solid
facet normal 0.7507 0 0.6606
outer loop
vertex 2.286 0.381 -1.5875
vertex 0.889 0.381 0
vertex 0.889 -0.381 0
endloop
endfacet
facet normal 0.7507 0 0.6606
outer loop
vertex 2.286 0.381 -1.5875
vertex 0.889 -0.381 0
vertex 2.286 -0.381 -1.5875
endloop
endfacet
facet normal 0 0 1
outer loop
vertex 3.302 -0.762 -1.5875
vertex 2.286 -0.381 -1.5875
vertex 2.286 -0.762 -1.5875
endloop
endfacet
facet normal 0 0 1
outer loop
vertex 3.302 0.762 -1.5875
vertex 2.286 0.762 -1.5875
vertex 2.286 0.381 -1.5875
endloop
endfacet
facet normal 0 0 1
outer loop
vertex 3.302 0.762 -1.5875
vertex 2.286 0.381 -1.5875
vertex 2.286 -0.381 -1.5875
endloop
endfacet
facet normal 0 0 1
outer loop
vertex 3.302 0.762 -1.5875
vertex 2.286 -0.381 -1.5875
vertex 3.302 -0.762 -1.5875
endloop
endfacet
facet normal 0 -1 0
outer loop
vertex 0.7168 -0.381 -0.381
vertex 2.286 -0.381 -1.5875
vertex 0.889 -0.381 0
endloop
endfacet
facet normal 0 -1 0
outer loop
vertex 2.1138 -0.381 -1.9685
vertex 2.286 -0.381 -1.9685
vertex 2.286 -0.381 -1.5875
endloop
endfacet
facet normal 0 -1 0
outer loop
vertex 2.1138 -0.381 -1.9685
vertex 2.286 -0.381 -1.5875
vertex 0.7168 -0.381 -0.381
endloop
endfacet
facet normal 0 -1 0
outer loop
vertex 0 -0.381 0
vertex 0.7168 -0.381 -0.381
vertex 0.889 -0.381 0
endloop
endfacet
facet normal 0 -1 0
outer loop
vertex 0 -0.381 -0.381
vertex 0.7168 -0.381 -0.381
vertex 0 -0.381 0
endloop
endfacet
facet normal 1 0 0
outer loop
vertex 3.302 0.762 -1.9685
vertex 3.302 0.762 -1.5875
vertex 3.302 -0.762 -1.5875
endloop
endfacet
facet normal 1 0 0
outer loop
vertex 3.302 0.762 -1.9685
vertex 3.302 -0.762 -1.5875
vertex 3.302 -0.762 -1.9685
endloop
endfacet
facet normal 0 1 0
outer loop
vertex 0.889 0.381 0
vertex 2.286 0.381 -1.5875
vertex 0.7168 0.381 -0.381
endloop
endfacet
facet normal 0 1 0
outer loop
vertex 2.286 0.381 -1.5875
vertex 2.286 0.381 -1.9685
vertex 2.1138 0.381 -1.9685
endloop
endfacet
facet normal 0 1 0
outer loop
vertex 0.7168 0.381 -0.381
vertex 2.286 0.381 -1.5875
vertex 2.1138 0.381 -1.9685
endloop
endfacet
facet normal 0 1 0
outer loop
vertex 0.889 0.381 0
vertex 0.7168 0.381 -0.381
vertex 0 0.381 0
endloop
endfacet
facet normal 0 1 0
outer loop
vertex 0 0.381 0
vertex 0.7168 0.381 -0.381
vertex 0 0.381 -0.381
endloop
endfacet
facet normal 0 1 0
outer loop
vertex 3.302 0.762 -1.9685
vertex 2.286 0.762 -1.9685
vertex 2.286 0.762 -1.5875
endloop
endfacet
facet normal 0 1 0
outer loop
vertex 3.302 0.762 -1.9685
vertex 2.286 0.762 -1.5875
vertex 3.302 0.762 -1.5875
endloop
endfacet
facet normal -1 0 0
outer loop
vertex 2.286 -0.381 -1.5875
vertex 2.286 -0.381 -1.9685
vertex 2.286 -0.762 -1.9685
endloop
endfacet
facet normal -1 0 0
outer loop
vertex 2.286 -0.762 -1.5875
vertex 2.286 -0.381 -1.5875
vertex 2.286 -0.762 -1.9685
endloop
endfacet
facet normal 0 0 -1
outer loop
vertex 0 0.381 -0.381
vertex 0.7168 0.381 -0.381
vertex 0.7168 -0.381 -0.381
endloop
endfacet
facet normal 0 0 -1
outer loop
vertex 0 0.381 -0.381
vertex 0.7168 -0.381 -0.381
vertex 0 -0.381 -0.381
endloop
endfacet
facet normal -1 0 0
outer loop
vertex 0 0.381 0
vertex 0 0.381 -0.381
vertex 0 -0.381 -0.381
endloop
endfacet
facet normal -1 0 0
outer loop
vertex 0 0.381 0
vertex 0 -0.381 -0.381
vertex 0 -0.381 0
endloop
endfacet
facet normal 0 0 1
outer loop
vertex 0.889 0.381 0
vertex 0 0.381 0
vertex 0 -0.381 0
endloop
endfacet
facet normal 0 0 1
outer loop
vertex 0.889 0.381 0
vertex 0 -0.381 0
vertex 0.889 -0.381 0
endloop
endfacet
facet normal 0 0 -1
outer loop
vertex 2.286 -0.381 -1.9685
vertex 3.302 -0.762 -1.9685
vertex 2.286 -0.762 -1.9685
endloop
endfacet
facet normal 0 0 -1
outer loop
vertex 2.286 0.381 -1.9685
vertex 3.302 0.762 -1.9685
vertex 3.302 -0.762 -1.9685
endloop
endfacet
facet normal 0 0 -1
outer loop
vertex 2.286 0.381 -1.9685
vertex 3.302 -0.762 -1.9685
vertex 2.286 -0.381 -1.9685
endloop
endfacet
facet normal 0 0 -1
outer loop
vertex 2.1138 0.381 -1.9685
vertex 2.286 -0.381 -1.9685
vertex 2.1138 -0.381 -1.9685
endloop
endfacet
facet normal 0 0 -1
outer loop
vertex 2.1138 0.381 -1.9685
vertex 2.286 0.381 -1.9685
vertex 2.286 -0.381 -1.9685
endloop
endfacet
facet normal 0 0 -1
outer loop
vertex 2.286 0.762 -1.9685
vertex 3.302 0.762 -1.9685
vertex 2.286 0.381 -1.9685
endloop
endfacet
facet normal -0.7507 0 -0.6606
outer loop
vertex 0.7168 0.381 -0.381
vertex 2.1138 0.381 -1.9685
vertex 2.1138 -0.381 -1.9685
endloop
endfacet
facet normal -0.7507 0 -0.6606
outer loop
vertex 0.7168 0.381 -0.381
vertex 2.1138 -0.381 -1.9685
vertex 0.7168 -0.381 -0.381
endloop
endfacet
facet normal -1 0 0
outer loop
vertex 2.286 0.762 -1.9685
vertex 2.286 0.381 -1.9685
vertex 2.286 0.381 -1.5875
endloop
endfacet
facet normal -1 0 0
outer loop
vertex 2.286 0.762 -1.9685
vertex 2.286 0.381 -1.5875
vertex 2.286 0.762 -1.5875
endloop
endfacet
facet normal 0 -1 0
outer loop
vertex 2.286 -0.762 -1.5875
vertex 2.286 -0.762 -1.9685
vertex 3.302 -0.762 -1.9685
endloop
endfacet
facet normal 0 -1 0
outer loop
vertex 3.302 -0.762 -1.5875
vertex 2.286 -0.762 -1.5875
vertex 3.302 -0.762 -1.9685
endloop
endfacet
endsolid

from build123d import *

# Parameters (mm, degrees)
BOSS_EXTRUDE1_DEPTH = 0.762
SKETCH2_W           = 2.286
SKETCH2_H           = 0.381
CUT_EXTRUDE1_DEPTH  = 2.9685


with BuildPart() as part:
    # Sketch1 → Boss-Extrude1 (new body, symmetric)
    with BuildSketch(Plane(origin=(0, 0, 0), x_dir=(1, 0, 0), z_dir=(0, 1, 0))):
        Polygon((0, 0), (0.889, 0), (2.286, 1.5875), (3.302, 1.5875), (3.302, 1.9685), (2.113762829, 1.9685), (0.716762829, 0.381), (0, 0.381), align=None)
    extrude(amount=BOSS_EXTRUDE1_DEPTH, both=True)

    # Sketch2 → Cut-Extrude1 (cut, through all)
    with BuildSketch(Plane(origin=(0, 0, -1.9685), x_dir=(-1, 0, 0), z_dir=(0, 0, -1))):
        with Locations((-1.143, 0.5715)):
            Rectangle(SKETCH2_W, SKETCH2_H)
    cut_extrude1 = extrude(amount=-CUT_EXTRUDE1_DEPTH, mode=Mode.SUBTRACT)

    # Mirror1: Cut-Extrude1 across plane
    add(cut_extrude1.mirror(Plane.ZX), mode=Mode.SUBTRACT)


solid = part.part
